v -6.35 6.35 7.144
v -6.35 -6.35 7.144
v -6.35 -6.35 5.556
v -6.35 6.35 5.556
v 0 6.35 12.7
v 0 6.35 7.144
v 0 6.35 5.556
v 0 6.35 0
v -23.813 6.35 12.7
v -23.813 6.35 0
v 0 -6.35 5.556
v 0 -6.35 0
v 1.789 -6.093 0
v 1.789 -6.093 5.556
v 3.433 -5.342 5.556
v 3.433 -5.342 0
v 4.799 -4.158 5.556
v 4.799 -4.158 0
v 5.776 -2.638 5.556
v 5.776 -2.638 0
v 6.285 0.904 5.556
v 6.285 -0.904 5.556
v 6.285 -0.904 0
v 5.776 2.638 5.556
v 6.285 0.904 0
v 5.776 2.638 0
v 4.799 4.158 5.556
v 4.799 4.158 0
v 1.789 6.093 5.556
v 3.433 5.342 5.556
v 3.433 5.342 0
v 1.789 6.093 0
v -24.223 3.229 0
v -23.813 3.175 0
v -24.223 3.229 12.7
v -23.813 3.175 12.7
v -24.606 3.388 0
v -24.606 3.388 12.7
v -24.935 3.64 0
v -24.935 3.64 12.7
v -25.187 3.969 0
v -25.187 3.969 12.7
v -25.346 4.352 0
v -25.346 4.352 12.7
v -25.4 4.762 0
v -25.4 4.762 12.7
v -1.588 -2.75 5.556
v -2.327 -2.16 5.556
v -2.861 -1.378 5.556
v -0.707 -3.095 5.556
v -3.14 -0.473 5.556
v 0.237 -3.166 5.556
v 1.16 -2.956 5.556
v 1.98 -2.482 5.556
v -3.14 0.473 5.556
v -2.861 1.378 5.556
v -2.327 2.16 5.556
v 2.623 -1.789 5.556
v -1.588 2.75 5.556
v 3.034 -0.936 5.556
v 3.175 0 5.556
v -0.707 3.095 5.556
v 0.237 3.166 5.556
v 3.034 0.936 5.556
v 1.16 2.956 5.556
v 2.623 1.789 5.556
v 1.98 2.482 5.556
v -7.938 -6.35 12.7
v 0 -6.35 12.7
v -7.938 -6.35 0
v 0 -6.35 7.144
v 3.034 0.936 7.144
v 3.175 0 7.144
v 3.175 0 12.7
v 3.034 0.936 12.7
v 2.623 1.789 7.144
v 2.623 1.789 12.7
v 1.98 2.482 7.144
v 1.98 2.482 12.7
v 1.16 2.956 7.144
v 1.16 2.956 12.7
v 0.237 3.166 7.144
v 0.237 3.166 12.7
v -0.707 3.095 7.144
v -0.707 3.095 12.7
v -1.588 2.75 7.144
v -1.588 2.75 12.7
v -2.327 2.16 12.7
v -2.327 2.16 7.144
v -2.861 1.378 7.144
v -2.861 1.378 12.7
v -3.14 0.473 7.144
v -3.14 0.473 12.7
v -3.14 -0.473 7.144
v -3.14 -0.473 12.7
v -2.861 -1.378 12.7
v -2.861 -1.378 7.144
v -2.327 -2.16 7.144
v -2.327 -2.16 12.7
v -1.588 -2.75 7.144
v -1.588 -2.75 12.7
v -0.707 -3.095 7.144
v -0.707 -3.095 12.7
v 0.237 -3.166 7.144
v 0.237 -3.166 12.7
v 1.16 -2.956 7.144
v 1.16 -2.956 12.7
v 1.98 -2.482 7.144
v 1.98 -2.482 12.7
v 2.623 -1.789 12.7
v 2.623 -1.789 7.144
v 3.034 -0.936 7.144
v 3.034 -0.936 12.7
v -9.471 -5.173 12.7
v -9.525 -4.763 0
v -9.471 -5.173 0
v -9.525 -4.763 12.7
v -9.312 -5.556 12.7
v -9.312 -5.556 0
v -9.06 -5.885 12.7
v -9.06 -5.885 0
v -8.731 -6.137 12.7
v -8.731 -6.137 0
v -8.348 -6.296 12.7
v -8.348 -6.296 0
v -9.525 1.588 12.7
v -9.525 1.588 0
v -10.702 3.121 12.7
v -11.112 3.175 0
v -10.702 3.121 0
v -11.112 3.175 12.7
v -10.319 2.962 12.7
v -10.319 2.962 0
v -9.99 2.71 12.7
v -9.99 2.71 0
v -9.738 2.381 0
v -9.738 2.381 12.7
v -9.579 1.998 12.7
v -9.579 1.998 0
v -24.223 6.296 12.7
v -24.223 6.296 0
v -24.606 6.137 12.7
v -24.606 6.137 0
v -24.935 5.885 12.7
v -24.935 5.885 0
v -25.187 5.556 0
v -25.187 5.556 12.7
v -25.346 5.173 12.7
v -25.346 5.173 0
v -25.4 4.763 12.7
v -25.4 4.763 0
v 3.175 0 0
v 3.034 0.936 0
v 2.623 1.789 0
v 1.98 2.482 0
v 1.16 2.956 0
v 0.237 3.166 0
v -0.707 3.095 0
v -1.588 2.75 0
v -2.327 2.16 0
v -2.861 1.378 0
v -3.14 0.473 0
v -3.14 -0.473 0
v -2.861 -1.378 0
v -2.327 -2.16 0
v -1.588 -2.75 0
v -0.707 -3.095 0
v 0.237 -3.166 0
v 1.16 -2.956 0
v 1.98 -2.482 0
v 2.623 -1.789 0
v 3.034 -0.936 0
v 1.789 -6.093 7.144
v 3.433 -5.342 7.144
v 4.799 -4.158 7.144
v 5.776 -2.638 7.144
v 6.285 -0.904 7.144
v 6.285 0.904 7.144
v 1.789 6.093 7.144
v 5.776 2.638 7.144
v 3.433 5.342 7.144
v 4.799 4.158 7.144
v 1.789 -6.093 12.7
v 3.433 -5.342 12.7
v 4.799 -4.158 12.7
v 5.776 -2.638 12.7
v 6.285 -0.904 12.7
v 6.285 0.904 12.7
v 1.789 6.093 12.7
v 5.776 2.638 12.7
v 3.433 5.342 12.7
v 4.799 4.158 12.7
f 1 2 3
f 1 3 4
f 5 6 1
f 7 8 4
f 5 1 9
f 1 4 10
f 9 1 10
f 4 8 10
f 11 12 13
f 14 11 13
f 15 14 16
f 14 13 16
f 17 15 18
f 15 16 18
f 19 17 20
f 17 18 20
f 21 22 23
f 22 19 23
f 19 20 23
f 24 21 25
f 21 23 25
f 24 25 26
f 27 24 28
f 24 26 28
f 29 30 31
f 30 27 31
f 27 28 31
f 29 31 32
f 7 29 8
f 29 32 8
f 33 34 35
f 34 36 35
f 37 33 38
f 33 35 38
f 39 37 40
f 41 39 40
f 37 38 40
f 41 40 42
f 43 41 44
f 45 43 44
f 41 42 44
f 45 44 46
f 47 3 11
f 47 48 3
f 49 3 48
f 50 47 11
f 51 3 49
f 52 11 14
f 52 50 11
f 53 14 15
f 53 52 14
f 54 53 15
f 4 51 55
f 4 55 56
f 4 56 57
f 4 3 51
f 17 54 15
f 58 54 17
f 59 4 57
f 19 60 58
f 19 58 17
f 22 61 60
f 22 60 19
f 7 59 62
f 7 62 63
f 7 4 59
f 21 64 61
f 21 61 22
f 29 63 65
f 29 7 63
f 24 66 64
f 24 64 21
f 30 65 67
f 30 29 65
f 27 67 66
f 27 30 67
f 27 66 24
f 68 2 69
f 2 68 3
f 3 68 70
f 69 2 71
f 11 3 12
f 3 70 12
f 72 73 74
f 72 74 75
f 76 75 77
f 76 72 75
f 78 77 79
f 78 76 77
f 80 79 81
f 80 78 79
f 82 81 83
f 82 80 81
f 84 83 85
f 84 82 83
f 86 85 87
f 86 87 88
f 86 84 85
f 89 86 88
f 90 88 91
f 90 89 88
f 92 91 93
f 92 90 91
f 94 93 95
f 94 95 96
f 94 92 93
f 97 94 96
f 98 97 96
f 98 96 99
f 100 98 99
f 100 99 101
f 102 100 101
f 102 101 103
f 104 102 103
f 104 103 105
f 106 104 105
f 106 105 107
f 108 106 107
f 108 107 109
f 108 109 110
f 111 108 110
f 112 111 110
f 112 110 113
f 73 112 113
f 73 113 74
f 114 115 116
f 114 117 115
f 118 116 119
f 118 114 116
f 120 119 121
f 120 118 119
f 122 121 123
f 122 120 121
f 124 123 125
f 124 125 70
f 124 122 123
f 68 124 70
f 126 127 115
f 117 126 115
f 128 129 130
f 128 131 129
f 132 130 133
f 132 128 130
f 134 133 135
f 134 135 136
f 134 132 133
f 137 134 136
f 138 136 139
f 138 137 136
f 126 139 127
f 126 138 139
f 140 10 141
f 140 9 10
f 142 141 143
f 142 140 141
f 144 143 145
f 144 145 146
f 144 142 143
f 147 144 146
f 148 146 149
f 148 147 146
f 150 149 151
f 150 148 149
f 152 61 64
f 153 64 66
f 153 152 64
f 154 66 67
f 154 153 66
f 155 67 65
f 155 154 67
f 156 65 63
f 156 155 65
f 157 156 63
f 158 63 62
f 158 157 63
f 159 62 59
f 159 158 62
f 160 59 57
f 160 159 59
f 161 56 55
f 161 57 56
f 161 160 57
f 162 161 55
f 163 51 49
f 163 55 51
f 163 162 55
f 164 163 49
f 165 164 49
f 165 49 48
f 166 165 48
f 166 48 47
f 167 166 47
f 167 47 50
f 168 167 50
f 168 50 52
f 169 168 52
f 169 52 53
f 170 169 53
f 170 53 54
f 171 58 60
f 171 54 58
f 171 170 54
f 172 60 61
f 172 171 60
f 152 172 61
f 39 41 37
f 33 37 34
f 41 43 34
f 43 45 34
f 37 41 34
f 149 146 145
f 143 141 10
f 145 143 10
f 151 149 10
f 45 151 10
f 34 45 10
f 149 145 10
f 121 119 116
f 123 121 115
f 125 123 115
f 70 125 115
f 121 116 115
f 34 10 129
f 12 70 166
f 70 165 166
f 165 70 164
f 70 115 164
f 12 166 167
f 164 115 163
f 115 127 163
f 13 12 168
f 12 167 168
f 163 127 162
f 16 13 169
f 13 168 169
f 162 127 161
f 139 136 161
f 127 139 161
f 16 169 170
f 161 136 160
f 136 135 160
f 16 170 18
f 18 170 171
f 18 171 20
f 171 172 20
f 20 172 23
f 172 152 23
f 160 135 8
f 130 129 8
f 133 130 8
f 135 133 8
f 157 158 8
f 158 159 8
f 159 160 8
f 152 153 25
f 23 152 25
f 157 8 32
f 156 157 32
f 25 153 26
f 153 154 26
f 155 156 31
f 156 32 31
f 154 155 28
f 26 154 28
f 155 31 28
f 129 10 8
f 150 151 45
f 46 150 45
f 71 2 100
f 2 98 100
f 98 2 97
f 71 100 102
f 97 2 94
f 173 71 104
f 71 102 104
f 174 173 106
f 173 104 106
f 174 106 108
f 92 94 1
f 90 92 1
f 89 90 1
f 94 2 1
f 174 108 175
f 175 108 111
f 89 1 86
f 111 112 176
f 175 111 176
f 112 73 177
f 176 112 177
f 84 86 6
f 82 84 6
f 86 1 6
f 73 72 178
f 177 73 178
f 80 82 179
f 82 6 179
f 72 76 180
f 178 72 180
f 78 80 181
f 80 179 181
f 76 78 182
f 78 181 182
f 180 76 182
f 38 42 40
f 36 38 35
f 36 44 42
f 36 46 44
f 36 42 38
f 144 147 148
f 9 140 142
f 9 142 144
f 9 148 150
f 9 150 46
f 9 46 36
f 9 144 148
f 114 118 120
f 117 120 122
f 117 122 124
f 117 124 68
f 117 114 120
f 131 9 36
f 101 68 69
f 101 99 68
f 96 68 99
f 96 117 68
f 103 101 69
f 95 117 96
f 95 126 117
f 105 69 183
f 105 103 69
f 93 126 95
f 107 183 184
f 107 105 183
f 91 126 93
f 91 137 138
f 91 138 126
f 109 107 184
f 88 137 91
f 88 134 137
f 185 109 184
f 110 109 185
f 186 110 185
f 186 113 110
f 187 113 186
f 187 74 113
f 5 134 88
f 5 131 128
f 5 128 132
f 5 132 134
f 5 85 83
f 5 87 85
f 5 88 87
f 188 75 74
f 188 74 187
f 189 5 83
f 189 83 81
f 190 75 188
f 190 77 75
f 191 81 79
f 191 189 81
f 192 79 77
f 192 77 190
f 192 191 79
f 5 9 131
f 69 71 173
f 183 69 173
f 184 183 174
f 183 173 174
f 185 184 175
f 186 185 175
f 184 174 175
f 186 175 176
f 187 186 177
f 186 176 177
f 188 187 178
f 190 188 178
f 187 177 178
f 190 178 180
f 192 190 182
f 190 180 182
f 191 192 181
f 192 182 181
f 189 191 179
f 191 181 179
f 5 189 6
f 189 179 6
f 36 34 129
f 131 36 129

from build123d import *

# Parameters (mm, degrees)
SKETCH1_R           = 3.175
BOSS_EXTRUDE1_DEPTH = 12.7
CUT_EXTRUDE1_START  = -5.55625
SKETCH2_W           = 12.7
SKETCH2_H           = 12.7
CUT_EXTRUDE1_DEPTH  = 1.5875
FILLET1_R           = 1.5875


with BuildPart() as part:
    # Sketch1 → Boss-Extrude1 (new body)
    with BuildSketch(Plane.XY):
        with BuildLine():
            ThreePointArc((0, -6.35), (6.35, 0), (0, 6.35))
            Line((0, 6.35), (-25.4, 6.35))
            Line((-25.4, 6.35), (-25.4, 3.175))
            Line((-25.4, 3.175), (-9.525, 3.175))
            Line((-9.525, 3.175), (-9.525, -6.35))
            Line((-9.525, -6.35), (0, -6.35))
        make_face()
        Circle(SKETCH1_R, mode=Mode.SUBTRACT)
    extrude(amount=BOSS_EXTRUDE1_DEPTH)

    # Sketch2 → Cut-Extrude1 (cut)
    with BuildSketch(Plane.XY.offset(12.7).offset(CUT_EXTRUDE1_START)):
        Rectangle(SKETCH2_W, SKETCH2_H)
    extrude(amount=-CUT_EXTRUDE1_DEPTH, mode=Mode.SUBTRACT)

    # Fillet1
    fillet1_edges = [part.edges().sort_by_distance(p)[0] for p in [
        (-9.525, 3.175, 6.35),
        (-9.525, -6.35, 6.35),
        (-25.4, 6.35, 6.35),
        (-25.4, 3.175, 6.35),
    ]]
    fillet(fillet1_edges, radius=FILLET1_R - 0.0001)  # a hair under: the kernel refuses the full size


solid = part.part
